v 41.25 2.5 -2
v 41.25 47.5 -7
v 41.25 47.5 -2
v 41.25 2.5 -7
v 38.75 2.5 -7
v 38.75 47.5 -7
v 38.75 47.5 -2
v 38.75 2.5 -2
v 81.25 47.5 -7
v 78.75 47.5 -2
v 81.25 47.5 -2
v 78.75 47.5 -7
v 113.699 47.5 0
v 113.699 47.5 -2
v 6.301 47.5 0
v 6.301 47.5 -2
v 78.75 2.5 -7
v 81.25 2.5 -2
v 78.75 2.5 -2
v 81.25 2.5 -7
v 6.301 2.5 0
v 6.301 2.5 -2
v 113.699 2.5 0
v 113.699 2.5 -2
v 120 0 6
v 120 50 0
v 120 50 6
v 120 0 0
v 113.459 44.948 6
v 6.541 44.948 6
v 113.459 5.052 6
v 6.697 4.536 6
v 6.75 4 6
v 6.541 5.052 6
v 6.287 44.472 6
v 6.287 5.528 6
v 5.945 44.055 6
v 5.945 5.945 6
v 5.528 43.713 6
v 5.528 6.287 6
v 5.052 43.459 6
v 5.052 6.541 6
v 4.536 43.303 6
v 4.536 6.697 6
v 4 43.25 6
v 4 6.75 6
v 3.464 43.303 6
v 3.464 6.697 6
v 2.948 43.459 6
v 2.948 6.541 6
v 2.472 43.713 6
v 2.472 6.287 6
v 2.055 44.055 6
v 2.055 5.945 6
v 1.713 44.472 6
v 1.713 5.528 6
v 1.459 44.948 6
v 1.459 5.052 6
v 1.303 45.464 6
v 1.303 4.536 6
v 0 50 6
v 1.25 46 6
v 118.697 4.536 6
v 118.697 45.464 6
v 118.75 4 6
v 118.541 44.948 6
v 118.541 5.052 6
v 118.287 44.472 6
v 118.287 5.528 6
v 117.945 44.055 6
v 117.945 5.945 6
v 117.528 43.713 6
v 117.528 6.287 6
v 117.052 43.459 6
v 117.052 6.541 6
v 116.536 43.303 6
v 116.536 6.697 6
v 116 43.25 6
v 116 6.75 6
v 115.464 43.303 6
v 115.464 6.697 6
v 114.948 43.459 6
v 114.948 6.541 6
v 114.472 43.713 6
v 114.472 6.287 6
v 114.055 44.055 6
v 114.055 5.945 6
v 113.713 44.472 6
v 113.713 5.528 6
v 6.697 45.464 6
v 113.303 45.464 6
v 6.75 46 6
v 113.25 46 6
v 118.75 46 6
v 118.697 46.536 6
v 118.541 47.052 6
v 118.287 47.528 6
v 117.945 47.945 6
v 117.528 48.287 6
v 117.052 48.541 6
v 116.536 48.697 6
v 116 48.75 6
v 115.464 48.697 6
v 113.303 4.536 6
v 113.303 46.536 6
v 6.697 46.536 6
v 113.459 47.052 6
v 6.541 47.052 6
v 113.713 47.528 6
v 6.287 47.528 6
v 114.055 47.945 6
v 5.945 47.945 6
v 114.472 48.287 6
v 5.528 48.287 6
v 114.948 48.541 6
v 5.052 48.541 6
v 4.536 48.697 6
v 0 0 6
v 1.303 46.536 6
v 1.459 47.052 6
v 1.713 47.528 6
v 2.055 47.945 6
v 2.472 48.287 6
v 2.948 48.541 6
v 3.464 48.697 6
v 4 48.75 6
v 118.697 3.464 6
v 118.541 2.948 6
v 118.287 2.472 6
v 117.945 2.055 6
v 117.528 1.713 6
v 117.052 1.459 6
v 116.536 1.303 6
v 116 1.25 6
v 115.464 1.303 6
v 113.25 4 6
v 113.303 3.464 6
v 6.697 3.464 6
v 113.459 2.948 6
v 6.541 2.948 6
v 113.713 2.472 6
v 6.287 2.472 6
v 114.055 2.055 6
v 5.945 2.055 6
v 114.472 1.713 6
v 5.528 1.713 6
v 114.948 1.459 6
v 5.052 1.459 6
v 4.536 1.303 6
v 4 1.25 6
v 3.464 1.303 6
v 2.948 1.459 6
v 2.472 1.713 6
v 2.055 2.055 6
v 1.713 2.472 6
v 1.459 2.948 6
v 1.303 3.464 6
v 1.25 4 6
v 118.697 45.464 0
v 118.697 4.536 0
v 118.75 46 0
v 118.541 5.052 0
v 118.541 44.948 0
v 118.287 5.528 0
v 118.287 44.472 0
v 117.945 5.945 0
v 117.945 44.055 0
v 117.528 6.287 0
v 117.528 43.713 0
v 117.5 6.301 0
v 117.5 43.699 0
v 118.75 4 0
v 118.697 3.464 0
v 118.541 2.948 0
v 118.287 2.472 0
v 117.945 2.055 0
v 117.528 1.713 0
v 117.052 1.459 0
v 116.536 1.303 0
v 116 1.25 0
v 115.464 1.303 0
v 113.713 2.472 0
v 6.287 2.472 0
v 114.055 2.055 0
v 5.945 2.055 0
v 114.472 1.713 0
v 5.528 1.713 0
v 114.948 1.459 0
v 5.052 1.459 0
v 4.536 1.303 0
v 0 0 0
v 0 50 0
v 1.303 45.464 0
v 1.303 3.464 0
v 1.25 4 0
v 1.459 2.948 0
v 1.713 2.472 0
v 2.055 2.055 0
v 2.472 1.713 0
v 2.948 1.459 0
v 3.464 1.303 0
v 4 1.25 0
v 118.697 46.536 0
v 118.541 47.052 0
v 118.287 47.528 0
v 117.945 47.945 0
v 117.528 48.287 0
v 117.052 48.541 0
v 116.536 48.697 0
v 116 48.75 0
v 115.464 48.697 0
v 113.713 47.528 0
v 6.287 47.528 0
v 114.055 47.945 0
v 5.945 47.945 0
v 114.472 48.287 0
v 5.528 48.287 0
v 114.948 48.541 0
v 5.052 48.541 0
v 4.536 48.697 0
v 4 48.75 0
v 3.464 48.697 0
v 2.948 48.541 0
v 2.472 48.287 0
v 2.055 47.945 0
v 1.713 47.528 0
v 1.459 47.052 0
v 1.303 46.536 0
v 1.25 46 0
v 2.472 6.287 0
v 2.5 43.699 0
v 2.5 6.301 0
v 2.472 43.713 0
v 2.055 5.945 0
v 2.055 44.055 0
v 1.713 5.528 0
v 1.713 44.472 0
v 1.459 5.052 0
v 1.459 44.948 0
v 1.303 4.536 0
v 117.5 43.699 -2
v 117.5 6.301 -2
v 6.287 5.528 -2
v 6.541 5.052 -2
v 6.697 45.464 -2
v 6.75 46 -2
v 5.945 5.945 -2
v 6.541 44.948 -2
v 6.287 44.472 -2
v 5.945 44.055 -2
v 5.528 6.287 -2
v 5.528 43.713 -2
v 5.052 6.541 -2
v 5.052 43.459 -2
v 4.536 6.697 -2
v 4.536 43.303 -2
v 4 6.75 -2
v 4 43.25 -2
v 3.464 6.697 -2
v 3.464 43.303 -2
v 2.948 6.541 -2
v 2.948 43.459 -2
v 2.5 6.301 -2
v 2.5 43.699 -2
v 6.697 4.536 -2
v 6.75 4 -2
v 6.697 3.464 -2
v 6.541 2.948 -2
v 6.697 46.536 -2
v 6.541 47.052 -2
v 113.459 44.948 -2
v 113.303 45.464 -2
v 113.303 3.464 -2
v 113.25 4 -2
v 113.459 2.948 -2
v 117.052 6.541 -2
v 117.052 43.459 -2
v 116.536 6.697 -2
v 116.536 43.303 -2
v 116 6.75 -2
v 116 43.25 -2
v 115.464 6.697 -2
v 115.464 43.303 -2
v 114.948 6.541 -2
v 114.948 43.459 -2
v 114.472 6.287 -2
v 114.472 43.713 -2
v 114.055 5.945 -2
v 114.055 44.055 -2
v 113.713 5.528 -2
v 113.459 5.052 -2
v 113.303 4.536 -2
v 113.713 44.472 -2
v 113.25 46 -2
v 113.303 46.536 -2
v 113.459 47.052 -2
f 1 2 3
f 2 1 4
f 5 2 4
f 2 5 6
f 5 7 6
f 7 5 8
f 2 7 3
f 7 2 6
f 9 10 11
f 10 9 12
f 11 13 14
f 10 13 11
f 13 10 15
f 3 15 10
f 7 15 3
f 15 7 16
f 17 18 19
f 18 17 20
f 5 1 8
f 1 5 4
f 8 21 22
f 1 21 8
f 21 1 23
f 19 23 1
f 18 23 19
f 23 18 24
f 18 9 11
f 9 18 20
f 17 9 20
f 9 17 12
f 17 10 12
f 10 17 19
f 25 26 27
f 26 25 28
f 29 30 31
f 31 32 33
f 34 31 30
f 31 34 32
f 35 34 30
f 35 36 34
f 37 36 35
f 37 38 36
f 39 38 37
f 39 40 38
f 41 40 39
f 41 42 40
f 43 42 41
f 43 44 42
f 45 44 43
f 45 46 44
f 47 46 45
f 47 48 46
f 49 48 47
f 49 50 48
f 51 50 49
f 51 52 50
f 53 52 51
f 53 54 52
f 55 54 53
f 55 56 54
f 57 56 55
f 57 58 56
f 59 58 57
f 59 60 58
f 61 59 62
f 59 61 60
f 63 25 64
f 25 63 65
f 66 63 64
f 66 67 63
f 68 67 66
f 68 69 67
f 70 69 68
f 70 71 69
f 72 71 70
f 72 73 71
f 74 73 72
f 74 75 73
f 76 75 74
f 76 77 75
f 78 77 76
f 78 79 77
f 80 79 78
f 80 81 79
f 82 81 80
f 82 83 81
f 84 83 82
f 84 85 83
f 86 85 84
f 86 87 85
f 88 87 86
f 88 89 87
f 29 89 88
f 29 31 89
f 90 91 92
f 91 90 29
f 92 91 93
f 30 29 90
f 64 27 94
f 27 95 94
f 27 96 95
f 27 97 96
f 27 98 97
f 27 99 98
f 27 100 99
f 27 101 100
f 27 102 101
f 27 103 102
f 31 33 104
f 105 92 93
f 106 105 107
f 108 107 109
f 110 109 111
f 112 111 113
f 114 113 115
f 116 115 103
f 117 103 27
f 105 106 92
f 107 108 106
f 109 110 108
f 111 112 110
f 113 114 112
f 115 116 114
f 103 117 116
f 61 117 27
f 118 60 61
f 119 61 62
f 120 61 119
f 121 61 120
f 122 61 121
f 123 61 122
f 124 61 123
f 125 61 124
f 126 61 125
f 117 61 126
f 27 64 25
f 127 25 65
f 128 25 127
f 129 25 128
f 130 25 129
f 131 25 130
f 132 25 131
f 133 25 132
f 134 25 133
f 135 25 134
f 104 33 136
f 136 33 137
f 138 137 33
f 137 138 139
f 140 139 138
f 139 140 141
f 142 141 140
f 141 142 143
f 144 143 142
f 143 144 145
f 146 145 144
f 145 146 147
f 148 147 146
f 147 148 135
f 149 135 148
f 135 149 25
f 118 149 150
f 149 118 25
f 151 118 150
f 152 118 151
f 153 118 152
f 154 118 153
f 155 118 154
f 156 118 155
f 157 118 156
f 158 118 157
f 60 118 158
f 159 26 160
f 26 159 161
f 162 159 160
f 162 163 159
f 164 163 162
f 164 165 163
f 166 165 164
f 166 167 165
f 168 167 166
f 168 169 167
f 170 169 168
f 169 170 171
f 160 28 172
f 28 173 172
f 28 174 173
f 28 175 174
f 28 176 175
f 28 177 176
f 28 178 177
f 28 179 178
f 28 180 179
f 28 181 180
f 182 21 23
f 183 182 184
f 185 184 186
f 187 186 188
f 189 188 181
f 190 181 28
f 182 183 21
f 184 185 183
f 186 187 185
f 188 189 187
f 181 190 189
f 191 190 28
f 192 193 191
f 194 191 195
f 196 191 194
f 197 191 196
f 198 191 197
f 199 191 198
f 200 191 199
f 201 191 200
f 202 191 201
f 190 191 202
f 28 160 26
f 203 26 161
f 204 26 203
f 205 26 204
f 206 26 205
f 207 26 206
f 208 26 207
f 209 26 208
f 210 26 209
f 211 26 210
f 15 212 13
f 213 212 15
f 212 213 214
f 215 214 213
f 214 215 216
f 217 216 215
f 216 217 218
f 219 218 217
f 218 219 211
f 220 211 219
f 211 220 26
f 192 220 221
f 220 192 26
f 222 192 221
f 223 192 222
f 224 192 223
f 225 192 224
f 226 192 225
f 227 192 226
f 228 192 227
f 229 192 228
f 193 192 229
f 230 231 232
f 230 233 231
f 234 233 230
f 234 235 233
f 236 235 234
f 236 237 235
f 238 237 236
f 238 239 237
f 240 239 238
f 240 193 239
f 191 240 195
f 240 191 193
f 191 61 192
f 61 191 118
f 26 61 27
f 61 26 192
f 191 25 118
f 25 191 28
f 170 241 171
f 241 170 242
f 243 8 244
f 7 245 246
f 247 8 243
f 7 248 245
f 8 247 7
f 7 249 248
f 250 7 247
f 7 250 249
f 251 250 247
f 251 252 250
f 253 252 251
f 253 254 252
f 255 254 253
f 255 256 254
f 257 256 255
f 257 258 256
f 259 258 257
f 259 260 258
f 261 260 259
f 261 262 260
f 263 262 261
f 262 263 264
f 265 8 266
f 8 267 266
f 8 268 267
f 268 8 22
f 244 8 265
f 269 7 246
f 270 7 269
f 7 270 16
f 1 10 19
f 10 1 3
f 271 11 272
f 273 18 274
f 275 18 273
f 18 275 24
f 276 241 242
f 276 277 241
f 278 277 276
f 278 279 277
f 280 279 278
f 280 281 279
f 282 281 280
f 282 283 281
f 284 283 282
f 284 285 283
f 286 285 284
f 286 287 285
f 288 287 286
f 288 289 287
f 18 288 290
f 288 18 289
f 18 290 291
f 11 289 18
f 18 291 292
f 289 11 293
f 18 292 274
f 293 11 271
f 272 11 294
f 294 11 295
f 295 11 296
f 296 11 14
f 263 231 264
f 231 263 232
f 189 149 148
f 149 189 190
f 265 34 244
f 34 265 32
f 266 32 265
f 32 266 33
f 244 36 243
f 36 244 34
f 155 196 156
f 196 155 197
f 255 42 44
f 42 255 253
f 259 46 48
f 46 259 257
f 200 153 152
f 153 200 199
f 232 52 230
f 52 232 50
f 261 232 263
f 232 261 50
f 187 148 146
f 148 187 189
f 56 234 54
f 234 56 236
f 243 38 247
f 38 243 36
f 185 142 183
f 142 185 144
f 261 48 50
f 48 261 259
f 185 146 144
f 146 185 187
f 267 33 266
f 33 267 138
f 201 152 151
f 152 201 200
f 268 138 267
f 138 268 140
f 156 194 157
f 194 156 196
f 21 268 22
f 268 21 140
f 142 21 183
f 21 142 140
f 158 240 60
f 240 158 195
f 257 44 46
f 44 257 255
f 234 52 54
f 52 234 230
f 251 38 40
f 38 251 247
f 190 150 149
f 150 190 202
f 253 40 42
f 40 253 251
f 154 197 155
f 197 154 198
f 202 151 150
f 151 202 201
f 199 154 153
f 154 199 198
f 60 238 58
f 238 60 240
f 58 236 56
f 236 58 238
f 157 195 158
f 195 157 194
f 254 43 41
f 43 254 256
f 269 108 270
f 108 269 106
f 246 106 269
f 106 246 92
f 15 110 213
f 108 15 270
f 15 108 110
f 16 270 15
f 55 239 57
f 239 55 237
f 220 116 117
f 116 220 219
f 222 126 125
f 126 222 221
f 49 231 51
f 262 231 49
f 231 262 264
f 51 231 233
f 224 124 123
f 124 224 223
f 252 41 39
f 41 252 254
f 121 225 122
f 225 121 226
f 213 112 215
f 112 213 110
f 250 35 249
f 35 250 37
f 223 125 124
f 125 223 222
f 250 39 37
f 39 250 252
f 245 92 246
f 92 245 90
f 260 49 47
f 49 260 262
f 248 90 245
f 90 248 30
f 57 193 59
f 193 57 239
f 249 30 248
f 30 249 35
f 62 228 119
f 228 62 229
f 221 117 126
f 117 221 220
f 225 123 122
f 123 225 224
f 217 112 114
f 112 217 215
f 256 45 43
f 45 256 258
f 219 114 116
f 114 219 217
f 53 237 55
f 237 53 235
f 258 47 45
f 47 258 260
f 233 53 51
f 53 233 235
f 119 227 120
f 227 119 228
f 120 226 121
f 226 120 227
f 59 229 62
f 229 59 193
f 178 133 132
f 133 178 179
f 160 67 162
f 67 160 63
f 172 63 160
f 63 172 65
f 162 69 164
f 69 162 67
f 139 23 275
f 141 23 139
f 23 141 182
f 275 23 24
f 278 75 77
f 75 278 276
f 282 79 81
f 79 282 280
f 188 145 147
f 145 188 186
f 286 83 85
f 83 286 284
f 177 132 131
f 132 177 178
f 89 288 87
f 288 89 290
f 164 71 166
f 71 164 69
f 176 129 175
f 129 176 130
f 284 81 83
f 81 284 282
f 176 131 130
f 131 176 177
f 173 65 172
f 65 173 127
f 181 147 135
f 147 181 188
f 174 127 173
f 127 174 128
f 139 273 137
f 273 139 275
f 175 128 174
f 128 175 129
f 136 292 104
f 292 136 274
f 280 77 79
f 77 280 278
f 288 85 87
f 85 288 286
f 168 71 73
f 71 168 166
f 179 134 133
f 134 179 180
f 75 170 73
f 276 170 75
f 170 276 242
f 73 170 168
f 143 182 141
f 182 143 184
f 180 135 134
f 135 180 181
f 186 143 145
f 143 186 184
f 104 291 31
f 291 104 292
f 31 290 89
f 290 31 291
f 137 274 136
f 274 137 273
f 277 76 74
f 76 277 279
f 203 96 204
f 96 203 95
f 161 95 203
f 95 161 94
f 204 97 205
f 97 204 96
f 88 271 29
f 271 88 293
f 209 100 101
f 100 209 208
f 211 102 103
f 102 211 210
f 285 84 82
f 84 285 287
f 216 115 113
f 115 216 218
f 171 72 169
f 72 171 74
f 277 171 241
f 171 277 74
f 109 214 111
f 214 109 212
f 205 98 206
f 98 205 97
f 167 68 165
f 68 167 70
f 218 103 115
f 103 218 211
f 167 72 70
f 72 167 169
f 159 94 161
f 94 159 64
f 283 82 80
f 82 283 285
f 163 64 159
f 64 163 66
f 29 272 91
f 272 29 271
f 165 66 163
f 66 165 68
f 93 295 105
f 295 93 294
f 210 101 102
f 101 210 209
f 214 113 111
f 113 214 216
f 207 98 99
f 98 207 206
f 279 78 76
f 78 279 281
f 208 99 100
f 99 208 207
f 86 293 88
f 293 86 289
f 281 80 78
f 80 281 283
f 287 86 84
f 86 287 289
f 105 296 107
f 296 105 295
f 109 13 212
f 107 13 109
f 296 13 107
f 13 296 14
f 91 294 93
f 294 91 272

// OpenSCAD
$fn = 32;

// ----------------------------------------------------------------------
// Enclosure lid: 120 x 50 x 6 mm, 4 bolt holes
// ----------------------------------------------------------------------

// --- parameters (mm) ---
length = 120;             // lid length, X
width = 50;               // lid width, Y
plate_t = 6;              // lid plate thickness
bolt_d = 5.5;             // bolt clearance
boss_lip = 4;             // bolt hole inset from the corner
sink = 1;                 // overlap of the lip and ribs into the plate
lip_h = 3;                // lip height below the plate
lip_wall = 2.5;           // lip wall thickness
rib_n = 2;                // stiffening ribs
rib_t = 2.5;              // rib thickness
rib_h = 8;                // rib height below the plate

module plate() {
  cube([length, width, plate_t]);
  /* lip that drops into the housing opening, sunk into the plate */
  translate([lip_wall, lip_wall, -lip_h + sink]) cube([length - 2 * lip_wall, width - 2 * lip_wall, lip_h]);
  /* stiffening ribs under the plate */
  for (i = [1 : rib_n]) translate([length * i / (rib_n + 1) - rib_t / 2, lip_wall, -rib_h + sink]) cube([rib_t, width - 2 * lip_wall, rib_h]);
}

difference() {
  plate();
  /* bolt pattern matching the corner bosses */
  for (sx = [0, 1]) for (sy = [0, 1])
    translate([sx * (length - 2 * boss_lip) + boss_lip, sy * (width - 2 * boss_lip) + boss_lip, -lip_h - 1])
      cylinder(h = plate_t + lip_h + 2, d = bolt_d);
}
